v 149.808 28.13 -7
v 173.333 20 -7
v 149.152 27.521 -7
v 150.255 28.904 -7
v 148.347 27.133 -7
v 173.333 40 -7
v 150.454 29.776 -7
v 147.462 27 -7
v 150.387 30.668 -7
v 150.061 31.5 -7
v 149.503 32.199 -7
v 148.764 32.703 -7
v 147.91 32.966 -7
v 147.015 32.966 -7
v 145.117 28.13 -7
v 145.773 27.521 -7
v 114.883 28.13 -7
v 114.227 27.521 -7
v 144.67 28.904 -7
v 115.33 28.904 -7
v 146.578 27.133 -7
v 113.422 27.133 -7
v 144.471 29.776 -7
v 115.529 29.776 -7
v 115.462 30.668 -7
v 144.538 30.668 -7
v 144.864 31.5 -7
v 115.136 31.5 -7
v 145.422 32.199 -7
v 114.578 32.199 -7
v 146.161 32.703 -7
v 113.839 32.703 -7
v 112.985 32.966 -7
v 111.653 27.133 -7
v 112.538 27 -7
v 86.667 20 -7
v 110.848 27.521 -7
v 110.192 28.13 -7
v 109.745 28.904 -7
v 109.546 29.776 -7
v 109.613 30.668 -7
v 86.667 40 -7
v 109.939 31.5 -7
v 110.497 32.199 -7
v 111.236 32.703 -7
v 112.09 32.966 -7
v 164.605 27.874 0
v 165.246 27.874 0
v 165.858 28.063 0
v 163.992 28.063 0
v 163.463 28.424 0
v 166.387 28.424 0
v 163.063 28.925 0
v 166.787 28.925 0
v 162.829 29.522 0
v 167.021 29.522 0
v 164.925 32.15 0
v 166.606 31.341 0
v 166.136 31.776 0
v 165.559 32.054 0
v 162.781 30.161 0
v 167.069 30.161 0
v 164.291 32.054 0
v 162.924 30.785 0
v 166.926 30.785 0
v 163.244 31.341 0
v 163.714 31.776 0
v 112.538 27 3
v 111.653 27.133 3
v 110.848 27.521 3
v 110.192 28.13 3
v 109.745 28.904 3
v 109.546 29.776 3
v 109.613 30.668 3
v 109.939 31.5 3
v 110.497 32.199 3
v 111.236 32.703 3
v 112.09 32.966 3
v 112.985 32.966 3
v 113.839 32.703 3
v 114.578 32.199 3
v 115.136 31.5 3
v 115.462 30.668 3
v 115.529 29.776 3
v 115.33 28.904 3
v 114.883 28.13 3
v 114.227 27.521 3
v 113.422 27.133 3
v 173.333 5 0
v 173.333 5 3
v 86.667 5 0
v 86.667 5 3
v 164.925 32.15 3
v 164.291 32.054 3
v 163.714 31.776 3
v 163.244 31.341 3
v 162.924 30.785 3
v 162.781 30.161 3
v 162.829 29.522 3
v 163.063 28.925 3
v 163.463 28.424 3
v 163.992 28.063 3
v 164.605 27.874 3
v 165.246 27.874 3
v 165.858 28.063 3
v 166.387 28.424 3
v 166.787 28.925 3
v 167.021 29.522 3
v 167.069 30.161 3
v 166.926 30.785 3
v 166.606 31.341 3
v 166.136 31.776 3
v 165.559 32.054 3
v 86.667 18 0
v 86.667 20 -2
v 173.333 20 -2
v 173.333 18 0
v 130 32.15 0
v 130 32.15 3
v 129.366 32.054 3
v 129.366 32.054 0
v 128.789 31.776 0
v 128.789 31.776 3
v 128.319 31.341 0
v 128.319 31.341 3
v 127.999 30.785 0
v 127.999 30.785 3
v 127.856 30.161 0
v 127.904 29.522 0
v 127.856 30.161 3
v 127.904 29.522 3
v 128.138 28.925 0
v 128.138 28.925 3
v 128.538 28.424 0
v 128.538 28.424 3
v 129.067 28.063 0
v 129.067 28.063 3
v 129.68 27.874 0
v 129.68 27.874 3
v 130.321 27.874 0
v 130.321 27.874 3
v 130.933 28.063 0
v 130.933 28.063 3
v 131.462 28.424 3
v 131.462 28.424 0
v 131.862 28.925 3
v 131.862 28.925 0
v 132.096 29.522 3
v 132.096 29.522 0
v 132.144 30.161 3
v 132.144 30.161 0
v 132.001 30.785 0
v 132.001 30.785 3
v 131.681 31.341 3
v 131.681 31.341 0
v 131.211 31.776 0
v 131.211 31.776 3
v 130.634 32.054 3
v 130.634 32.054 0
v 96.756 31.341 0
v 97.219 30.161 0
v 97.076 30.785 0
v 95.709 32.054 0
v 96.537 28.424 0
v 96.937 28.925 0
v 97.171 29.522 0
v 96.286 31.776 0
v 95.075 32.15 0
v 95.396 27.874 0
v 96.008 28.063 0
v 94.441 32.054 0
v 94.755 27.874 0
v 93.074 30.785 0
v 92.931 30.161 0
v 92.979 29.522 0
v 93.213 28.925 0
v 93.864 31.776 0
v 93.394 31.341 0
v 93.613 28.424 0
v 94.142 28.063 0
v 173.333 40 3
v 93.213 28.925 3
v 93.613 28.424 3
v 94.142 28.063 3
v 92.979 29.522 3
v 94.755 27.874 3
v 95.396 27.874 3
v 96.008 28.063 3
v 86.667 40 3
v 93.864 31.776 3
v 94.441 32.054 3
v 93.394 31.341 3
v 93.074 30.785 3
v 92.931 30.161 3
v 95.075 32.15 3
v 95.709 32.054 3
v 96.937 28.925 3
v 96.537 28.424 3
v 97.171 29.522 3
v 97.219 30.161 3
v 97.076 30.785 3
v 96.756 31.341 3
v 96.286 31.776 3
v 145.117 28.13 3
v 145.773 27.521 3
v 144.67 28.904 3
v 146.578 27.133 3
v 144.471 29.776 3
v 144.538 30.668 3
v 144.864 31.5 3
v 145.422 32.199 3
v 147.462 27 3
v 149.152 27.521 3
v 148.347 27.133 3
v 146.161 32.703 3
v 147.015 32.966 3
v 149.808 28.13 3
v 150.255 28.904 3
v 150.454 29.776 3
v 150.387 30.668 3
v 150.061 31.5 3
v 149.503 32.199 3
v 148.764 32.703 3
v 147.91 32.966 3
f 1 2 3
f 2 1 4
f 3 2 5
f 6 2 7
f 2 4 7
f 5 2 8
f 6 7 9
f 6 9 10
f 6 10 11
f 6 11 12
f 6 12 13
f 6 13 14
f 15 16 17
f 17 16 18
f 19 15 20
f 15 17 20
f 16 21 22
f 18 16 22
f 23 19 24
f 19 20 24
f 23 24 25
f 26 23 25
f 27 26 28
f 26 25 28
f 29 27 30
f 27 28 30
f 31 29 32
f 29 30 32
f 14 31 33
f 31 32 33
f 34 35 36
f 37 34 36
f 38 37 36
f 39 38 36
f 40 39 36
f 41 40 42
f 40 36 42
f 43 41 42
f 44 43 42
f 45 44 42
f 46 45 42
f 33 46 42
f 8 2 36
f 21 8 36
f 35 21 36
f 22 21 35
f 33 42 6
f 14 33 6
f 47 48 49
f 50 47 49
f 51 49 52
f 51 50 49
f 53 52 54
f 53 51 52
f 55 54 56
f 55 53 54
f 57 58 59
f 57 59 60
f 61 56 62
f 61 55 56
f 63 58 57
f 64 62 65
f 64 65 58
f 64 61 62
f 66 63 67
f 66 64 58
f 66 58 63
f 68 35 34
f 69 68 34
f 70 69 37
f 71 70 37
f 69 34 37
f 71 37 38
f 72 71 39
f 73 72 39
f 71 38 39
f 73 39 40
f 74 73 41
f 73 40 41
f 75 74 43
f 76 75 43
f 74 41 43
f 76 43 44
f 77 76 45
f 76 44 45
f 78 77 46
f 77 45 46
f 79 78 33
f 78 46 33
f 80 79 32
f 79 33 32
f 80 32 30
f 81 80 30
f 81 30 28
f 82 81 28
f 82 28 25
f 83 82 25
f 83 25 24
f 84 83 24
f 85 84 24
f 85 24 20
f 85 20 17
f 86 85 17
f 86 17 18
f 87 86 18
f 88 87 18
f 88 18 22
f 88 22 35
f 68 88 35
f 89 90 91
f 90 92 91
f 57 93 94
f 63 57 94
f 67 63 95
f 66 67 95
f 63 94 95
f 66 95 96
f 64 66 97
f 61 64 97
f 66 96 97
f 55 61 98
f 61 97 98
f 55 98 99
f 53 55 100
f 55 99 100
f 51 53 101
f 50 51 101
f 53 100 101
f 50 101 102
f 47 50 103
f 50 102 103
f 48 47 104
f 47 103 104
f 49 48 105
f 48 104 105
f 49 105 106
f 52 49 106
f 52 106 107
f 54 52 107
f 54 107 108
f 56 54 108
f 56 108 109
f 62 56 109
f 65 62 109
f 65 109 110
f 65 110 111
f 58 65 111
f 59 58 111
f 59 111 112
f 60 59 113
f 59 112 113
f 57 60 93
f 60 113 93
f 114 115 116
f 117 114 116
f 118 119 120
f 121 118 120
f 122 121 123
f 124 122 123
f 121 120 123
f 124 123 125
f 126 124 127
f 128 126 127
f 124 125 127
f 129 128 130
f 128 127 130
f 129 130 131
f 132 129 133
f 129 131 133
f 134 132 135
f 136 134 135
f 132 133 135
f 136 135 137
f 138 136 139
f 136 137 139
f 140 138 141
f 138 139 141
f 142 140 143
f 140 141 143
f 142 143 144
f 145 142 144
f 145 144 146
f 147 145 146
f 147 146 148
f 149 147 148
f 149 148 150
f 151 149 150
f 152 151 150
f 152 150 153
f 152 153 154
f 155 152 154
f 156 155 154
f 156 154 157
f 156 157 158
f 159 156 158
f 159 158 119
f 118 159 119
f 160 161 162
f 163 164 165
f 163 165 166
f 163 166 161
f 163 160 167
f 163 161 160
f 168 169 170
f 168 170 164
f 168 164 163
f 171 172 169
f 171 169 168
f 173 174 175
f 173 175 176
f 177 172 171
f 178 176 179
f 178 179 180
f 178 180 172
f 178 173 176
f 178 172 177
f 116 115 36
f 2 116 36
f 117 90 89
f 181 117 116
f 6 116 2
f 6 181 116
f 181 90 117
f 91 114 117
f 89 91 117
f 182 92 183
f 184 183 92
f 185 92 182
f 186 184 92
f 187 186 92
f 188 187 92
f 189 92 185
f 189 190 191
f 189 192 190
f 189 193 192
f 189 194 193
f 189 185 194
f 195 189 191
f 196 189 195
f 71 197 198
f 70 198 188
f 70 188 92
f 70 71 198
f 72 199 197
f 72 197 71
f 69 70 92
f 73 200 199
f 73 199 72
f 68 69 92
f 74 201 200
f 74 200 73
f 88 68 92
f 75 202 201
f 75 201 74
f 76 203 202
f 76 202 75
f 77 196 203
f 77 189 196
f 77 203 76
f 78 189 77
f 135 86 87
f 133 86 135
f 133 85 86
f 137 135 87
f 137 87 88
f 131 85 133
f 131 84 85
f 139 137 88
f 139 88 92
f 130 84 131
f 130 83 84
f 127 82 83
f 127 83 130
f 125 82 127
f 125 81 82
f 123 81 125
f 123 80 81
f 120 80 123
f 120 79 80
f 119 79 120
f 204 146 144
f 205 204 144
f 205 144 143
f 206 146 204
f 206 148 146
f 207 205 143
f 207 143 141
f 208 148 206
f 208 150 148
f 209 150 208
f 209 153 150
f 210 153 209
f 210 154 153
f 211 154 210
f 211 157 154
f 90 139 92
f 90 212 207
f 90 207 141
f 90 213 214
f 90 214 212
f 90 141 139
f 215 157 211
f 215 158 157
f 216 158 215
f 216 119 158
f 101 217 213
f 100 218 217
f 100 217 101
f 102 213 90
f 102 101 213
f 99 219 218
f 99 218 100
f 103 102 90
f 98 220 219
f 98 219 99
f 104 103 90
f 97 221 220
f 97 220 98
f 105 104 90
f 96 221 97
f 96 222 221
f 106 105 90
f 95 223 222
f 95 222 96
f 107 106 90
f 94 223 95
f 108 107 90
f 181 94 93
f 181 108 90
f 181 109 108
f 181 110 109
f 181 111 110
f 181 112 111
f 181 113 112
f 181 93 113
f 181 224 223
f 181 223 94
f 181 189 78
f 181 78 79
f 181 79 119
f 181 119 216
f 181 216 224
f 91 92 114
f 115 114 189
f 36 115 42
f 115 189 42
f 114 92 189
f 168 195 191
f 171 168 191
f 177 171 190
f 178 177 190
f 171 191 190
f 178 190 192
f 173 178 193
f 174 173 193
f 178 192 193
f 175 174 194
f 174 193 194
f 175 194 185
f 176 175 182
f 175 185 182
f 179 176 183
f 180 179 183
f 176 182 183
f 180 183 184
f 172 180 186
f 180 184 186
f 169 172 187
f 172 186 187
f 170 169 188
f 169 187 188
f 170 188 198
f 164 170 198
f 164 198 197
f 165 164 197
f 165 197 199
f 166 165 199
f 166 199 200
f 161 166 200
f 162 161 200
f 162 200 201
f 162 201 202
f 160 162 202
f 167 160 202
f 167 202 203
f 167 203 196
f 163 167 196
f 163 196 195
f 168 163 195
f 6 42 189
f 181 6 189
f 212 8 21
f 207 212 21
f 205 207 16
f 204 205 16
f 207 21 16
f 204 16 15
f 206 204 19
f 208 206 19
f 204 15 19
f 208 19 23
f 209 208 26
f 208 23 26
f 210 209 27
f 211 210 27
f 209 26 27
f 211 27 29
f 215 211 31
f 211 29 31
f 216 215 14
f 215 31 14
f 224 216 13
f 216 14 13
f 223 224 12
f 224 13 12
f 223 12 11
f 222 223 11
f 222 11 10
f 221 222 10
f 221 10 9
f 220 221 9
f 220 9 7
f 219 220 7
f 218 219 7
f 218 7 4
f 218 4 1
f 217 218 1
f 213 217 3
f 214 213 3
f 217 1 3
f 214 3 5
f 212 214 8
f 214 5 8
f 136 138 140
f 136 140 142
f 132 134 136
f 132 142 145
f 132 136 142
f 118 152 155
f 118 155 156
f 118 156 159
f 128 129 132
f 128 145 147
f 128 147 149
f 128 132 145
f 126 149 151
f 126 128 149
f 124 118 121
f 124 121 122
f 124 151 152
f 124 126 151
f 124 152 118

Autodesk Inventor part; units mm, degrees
ref_plane "YZ Plane" through (0, 0, 0) normal (1, 0, 0) x (0, 1, 0)
sketch "Sketch1" plane through (0, 0, 0) normal (0, 0, 1) x (1, 0, 0)
  line L0 (0, 0) -> (260, 0)
  line L1 (260, 0) -> (260, 20)
  line L2 (260, 20) -> (0, 20)
  line L3 (0, 20) -> (0, 0)
  dimension "d0" = 260
  dimension "d1" = 20
extrude "Extrusion1" add sketch "Sketch1" along normal blind 3
sketch "Sketch2" plane through (0, 0, 0) normal (0, 0, -1) x (-1, 0, 0)
  line L0 (0, 0) -> (-260, 0) projected
  line L1 (-12.5251, -24.7625) -> (-37.9251, -24.7625) projected
  line L2 (-260, 20) -> (0, 20) projected
  point P0 (-25.2251, 30)
  dimension "d5" = 25.4
  dimension "d6" = 12.7
  dimension "d62" = 10
sketch "Sketch5" plane through (0, 0, 0) normal (-1, 0, 0) x (0, 0, 1)
  line L0 (0, 20) -> (3, 20) projected
  line L1 (3, 20) -> (-7, 20)
  line L2 (-7, 20) -> (-7, 40)
  line L3 (-7, 40) -> (3, 40)
  line L4 (3, 40) -> (3, 20)
  point P0 (0, 0)
  point P1 (3, 30)
  point P2 (1.5, 20)
  dimension "d31" = 10
  dimension "d32" = 20
extrude "Extrusion3" add sketch "Sketch5" against normal up to surface (260 mm away)
sketch "Sketch6" plane through (0, 0, 3) normal (0, 0, 1) x (1, 0, 0)
  line L0 (0, 0) -> (0, 40) projected
  line L1 (260, 0) -> (260, 40) projected
  line L2 (0, 40) -> (260, 40) projected
  point P0 (42.6875, 30)
  point P1 (77.6125, 30)
  point P2 (182.3875, 30)
  point P3 (217.3125, 30)
  point P4 (112.5375, 30)
  point P5 (147.4625, 30)
  dimension "d35" = 42.6875
  dimension "d46" = 42.6875
  dimension "d47" = 34.925
  dimension "d48" = 34.925
  dimension "d49" = 34.925
  dimension "d50" = 34.925
  dimension "d51" = 10
hole "Hole2" at (42.6875, 30, 3) at (77.6125, 30, 3) at (182.3875, 30, 3) at (217.3125, 30, 3) at (112.5375, 30, 3) at (147.4625, 30, 3) direction (0, 0, -1) diameter 6 end through all
hole "Hole3" at (25.2251, 30, 0) direction (0, 0, 1) diameter 4.3 depth 6
pattern_linear "Rectangular Pattern2" count 7 spacing 34.925 along (1, 0, 0) of "Hole3"
chamfer "Chamfer1" distance 2 angle 45 1 edges at (130, 20, 0)
sketch "Sketch7" plane through (0, 0, 0) normal (-1, 0, 0) x (0, 0, 1)
  line L0 (0, 0) -> (3, 0) projected
  line L1 (0, 0) -> (3.6796, 0)
  line L2 (3.6796, 0) -> (3.6796, 5)
  line L3 (3.6796, 5) -> (0, 5)
  line L4 (0, 5) -> (0, 0)
  dimension "d66" = 5
extrude "Extrusion4" cut sketch "Sketch7" against normal through all
ref_plane "Work Plane1" through (173.3333, 20, -7) normal (1, 0, 0) x (0, 0, -1)
ref_plane "Work Plane2" through (86.6667, 20, -7) normal (1, 0, 0) x (0, 0, -1)
sketch "Sketch8" plane through (173.3333, 20, -7) normal (1, 0, 0) x (0, 0, -1)
  line L0 (-10, -15) -> (-7, -15) projected
  line L1 (-7, -15) -> (-7, -2) projected
  line L2 (-5, 0) -> (-7, -2) projected
  line L3 (0, 0) -> (-5, 0) projected
  line L4 (0, 20) -> (0, 0) projected
  line L5 (-10, 20) -> (0, 20) projected
  line L6 (-10, -15) -> (-10, 20) projected
  point P0 (-7, -20)
extrude "Extrusion5" cut sketch "Sketch8" along normal through all
sketch "Sketch9" plane through (86.6667, 20, -7) normal (1, 0, 0) x (0, 0, -1)
  line L0 (0, 13) -> (-10, 13) projected
  line L1 (-7, -15) -> (-10, -15) projected
  line L2 (-7, -2) -> (-7, -15) projected
  line L3 (-5, 0) -> (-7, -2) projected
  line L4 (0, 0) -> (-5, 0) projected
  line L5 (0, 20) -> (0, 0) projected
  line L6 (-10, 20) -> (0, 20) projected
  line L7 (-10, -15) -> (-10, 20) projected
  point P0 (-7, -20)
extrude "Extrusion6" cut sketch "Sketch9" against normal through all
equation "\"d6\" = 0.5 * d5"
equation "\"d46\" = d35"
equation "\"d48\" = d47"
equation "\"d49\" = d47"
equation "\"d50\" = d47"
properties part number "IR_Mount_Plate_3DPrint"
